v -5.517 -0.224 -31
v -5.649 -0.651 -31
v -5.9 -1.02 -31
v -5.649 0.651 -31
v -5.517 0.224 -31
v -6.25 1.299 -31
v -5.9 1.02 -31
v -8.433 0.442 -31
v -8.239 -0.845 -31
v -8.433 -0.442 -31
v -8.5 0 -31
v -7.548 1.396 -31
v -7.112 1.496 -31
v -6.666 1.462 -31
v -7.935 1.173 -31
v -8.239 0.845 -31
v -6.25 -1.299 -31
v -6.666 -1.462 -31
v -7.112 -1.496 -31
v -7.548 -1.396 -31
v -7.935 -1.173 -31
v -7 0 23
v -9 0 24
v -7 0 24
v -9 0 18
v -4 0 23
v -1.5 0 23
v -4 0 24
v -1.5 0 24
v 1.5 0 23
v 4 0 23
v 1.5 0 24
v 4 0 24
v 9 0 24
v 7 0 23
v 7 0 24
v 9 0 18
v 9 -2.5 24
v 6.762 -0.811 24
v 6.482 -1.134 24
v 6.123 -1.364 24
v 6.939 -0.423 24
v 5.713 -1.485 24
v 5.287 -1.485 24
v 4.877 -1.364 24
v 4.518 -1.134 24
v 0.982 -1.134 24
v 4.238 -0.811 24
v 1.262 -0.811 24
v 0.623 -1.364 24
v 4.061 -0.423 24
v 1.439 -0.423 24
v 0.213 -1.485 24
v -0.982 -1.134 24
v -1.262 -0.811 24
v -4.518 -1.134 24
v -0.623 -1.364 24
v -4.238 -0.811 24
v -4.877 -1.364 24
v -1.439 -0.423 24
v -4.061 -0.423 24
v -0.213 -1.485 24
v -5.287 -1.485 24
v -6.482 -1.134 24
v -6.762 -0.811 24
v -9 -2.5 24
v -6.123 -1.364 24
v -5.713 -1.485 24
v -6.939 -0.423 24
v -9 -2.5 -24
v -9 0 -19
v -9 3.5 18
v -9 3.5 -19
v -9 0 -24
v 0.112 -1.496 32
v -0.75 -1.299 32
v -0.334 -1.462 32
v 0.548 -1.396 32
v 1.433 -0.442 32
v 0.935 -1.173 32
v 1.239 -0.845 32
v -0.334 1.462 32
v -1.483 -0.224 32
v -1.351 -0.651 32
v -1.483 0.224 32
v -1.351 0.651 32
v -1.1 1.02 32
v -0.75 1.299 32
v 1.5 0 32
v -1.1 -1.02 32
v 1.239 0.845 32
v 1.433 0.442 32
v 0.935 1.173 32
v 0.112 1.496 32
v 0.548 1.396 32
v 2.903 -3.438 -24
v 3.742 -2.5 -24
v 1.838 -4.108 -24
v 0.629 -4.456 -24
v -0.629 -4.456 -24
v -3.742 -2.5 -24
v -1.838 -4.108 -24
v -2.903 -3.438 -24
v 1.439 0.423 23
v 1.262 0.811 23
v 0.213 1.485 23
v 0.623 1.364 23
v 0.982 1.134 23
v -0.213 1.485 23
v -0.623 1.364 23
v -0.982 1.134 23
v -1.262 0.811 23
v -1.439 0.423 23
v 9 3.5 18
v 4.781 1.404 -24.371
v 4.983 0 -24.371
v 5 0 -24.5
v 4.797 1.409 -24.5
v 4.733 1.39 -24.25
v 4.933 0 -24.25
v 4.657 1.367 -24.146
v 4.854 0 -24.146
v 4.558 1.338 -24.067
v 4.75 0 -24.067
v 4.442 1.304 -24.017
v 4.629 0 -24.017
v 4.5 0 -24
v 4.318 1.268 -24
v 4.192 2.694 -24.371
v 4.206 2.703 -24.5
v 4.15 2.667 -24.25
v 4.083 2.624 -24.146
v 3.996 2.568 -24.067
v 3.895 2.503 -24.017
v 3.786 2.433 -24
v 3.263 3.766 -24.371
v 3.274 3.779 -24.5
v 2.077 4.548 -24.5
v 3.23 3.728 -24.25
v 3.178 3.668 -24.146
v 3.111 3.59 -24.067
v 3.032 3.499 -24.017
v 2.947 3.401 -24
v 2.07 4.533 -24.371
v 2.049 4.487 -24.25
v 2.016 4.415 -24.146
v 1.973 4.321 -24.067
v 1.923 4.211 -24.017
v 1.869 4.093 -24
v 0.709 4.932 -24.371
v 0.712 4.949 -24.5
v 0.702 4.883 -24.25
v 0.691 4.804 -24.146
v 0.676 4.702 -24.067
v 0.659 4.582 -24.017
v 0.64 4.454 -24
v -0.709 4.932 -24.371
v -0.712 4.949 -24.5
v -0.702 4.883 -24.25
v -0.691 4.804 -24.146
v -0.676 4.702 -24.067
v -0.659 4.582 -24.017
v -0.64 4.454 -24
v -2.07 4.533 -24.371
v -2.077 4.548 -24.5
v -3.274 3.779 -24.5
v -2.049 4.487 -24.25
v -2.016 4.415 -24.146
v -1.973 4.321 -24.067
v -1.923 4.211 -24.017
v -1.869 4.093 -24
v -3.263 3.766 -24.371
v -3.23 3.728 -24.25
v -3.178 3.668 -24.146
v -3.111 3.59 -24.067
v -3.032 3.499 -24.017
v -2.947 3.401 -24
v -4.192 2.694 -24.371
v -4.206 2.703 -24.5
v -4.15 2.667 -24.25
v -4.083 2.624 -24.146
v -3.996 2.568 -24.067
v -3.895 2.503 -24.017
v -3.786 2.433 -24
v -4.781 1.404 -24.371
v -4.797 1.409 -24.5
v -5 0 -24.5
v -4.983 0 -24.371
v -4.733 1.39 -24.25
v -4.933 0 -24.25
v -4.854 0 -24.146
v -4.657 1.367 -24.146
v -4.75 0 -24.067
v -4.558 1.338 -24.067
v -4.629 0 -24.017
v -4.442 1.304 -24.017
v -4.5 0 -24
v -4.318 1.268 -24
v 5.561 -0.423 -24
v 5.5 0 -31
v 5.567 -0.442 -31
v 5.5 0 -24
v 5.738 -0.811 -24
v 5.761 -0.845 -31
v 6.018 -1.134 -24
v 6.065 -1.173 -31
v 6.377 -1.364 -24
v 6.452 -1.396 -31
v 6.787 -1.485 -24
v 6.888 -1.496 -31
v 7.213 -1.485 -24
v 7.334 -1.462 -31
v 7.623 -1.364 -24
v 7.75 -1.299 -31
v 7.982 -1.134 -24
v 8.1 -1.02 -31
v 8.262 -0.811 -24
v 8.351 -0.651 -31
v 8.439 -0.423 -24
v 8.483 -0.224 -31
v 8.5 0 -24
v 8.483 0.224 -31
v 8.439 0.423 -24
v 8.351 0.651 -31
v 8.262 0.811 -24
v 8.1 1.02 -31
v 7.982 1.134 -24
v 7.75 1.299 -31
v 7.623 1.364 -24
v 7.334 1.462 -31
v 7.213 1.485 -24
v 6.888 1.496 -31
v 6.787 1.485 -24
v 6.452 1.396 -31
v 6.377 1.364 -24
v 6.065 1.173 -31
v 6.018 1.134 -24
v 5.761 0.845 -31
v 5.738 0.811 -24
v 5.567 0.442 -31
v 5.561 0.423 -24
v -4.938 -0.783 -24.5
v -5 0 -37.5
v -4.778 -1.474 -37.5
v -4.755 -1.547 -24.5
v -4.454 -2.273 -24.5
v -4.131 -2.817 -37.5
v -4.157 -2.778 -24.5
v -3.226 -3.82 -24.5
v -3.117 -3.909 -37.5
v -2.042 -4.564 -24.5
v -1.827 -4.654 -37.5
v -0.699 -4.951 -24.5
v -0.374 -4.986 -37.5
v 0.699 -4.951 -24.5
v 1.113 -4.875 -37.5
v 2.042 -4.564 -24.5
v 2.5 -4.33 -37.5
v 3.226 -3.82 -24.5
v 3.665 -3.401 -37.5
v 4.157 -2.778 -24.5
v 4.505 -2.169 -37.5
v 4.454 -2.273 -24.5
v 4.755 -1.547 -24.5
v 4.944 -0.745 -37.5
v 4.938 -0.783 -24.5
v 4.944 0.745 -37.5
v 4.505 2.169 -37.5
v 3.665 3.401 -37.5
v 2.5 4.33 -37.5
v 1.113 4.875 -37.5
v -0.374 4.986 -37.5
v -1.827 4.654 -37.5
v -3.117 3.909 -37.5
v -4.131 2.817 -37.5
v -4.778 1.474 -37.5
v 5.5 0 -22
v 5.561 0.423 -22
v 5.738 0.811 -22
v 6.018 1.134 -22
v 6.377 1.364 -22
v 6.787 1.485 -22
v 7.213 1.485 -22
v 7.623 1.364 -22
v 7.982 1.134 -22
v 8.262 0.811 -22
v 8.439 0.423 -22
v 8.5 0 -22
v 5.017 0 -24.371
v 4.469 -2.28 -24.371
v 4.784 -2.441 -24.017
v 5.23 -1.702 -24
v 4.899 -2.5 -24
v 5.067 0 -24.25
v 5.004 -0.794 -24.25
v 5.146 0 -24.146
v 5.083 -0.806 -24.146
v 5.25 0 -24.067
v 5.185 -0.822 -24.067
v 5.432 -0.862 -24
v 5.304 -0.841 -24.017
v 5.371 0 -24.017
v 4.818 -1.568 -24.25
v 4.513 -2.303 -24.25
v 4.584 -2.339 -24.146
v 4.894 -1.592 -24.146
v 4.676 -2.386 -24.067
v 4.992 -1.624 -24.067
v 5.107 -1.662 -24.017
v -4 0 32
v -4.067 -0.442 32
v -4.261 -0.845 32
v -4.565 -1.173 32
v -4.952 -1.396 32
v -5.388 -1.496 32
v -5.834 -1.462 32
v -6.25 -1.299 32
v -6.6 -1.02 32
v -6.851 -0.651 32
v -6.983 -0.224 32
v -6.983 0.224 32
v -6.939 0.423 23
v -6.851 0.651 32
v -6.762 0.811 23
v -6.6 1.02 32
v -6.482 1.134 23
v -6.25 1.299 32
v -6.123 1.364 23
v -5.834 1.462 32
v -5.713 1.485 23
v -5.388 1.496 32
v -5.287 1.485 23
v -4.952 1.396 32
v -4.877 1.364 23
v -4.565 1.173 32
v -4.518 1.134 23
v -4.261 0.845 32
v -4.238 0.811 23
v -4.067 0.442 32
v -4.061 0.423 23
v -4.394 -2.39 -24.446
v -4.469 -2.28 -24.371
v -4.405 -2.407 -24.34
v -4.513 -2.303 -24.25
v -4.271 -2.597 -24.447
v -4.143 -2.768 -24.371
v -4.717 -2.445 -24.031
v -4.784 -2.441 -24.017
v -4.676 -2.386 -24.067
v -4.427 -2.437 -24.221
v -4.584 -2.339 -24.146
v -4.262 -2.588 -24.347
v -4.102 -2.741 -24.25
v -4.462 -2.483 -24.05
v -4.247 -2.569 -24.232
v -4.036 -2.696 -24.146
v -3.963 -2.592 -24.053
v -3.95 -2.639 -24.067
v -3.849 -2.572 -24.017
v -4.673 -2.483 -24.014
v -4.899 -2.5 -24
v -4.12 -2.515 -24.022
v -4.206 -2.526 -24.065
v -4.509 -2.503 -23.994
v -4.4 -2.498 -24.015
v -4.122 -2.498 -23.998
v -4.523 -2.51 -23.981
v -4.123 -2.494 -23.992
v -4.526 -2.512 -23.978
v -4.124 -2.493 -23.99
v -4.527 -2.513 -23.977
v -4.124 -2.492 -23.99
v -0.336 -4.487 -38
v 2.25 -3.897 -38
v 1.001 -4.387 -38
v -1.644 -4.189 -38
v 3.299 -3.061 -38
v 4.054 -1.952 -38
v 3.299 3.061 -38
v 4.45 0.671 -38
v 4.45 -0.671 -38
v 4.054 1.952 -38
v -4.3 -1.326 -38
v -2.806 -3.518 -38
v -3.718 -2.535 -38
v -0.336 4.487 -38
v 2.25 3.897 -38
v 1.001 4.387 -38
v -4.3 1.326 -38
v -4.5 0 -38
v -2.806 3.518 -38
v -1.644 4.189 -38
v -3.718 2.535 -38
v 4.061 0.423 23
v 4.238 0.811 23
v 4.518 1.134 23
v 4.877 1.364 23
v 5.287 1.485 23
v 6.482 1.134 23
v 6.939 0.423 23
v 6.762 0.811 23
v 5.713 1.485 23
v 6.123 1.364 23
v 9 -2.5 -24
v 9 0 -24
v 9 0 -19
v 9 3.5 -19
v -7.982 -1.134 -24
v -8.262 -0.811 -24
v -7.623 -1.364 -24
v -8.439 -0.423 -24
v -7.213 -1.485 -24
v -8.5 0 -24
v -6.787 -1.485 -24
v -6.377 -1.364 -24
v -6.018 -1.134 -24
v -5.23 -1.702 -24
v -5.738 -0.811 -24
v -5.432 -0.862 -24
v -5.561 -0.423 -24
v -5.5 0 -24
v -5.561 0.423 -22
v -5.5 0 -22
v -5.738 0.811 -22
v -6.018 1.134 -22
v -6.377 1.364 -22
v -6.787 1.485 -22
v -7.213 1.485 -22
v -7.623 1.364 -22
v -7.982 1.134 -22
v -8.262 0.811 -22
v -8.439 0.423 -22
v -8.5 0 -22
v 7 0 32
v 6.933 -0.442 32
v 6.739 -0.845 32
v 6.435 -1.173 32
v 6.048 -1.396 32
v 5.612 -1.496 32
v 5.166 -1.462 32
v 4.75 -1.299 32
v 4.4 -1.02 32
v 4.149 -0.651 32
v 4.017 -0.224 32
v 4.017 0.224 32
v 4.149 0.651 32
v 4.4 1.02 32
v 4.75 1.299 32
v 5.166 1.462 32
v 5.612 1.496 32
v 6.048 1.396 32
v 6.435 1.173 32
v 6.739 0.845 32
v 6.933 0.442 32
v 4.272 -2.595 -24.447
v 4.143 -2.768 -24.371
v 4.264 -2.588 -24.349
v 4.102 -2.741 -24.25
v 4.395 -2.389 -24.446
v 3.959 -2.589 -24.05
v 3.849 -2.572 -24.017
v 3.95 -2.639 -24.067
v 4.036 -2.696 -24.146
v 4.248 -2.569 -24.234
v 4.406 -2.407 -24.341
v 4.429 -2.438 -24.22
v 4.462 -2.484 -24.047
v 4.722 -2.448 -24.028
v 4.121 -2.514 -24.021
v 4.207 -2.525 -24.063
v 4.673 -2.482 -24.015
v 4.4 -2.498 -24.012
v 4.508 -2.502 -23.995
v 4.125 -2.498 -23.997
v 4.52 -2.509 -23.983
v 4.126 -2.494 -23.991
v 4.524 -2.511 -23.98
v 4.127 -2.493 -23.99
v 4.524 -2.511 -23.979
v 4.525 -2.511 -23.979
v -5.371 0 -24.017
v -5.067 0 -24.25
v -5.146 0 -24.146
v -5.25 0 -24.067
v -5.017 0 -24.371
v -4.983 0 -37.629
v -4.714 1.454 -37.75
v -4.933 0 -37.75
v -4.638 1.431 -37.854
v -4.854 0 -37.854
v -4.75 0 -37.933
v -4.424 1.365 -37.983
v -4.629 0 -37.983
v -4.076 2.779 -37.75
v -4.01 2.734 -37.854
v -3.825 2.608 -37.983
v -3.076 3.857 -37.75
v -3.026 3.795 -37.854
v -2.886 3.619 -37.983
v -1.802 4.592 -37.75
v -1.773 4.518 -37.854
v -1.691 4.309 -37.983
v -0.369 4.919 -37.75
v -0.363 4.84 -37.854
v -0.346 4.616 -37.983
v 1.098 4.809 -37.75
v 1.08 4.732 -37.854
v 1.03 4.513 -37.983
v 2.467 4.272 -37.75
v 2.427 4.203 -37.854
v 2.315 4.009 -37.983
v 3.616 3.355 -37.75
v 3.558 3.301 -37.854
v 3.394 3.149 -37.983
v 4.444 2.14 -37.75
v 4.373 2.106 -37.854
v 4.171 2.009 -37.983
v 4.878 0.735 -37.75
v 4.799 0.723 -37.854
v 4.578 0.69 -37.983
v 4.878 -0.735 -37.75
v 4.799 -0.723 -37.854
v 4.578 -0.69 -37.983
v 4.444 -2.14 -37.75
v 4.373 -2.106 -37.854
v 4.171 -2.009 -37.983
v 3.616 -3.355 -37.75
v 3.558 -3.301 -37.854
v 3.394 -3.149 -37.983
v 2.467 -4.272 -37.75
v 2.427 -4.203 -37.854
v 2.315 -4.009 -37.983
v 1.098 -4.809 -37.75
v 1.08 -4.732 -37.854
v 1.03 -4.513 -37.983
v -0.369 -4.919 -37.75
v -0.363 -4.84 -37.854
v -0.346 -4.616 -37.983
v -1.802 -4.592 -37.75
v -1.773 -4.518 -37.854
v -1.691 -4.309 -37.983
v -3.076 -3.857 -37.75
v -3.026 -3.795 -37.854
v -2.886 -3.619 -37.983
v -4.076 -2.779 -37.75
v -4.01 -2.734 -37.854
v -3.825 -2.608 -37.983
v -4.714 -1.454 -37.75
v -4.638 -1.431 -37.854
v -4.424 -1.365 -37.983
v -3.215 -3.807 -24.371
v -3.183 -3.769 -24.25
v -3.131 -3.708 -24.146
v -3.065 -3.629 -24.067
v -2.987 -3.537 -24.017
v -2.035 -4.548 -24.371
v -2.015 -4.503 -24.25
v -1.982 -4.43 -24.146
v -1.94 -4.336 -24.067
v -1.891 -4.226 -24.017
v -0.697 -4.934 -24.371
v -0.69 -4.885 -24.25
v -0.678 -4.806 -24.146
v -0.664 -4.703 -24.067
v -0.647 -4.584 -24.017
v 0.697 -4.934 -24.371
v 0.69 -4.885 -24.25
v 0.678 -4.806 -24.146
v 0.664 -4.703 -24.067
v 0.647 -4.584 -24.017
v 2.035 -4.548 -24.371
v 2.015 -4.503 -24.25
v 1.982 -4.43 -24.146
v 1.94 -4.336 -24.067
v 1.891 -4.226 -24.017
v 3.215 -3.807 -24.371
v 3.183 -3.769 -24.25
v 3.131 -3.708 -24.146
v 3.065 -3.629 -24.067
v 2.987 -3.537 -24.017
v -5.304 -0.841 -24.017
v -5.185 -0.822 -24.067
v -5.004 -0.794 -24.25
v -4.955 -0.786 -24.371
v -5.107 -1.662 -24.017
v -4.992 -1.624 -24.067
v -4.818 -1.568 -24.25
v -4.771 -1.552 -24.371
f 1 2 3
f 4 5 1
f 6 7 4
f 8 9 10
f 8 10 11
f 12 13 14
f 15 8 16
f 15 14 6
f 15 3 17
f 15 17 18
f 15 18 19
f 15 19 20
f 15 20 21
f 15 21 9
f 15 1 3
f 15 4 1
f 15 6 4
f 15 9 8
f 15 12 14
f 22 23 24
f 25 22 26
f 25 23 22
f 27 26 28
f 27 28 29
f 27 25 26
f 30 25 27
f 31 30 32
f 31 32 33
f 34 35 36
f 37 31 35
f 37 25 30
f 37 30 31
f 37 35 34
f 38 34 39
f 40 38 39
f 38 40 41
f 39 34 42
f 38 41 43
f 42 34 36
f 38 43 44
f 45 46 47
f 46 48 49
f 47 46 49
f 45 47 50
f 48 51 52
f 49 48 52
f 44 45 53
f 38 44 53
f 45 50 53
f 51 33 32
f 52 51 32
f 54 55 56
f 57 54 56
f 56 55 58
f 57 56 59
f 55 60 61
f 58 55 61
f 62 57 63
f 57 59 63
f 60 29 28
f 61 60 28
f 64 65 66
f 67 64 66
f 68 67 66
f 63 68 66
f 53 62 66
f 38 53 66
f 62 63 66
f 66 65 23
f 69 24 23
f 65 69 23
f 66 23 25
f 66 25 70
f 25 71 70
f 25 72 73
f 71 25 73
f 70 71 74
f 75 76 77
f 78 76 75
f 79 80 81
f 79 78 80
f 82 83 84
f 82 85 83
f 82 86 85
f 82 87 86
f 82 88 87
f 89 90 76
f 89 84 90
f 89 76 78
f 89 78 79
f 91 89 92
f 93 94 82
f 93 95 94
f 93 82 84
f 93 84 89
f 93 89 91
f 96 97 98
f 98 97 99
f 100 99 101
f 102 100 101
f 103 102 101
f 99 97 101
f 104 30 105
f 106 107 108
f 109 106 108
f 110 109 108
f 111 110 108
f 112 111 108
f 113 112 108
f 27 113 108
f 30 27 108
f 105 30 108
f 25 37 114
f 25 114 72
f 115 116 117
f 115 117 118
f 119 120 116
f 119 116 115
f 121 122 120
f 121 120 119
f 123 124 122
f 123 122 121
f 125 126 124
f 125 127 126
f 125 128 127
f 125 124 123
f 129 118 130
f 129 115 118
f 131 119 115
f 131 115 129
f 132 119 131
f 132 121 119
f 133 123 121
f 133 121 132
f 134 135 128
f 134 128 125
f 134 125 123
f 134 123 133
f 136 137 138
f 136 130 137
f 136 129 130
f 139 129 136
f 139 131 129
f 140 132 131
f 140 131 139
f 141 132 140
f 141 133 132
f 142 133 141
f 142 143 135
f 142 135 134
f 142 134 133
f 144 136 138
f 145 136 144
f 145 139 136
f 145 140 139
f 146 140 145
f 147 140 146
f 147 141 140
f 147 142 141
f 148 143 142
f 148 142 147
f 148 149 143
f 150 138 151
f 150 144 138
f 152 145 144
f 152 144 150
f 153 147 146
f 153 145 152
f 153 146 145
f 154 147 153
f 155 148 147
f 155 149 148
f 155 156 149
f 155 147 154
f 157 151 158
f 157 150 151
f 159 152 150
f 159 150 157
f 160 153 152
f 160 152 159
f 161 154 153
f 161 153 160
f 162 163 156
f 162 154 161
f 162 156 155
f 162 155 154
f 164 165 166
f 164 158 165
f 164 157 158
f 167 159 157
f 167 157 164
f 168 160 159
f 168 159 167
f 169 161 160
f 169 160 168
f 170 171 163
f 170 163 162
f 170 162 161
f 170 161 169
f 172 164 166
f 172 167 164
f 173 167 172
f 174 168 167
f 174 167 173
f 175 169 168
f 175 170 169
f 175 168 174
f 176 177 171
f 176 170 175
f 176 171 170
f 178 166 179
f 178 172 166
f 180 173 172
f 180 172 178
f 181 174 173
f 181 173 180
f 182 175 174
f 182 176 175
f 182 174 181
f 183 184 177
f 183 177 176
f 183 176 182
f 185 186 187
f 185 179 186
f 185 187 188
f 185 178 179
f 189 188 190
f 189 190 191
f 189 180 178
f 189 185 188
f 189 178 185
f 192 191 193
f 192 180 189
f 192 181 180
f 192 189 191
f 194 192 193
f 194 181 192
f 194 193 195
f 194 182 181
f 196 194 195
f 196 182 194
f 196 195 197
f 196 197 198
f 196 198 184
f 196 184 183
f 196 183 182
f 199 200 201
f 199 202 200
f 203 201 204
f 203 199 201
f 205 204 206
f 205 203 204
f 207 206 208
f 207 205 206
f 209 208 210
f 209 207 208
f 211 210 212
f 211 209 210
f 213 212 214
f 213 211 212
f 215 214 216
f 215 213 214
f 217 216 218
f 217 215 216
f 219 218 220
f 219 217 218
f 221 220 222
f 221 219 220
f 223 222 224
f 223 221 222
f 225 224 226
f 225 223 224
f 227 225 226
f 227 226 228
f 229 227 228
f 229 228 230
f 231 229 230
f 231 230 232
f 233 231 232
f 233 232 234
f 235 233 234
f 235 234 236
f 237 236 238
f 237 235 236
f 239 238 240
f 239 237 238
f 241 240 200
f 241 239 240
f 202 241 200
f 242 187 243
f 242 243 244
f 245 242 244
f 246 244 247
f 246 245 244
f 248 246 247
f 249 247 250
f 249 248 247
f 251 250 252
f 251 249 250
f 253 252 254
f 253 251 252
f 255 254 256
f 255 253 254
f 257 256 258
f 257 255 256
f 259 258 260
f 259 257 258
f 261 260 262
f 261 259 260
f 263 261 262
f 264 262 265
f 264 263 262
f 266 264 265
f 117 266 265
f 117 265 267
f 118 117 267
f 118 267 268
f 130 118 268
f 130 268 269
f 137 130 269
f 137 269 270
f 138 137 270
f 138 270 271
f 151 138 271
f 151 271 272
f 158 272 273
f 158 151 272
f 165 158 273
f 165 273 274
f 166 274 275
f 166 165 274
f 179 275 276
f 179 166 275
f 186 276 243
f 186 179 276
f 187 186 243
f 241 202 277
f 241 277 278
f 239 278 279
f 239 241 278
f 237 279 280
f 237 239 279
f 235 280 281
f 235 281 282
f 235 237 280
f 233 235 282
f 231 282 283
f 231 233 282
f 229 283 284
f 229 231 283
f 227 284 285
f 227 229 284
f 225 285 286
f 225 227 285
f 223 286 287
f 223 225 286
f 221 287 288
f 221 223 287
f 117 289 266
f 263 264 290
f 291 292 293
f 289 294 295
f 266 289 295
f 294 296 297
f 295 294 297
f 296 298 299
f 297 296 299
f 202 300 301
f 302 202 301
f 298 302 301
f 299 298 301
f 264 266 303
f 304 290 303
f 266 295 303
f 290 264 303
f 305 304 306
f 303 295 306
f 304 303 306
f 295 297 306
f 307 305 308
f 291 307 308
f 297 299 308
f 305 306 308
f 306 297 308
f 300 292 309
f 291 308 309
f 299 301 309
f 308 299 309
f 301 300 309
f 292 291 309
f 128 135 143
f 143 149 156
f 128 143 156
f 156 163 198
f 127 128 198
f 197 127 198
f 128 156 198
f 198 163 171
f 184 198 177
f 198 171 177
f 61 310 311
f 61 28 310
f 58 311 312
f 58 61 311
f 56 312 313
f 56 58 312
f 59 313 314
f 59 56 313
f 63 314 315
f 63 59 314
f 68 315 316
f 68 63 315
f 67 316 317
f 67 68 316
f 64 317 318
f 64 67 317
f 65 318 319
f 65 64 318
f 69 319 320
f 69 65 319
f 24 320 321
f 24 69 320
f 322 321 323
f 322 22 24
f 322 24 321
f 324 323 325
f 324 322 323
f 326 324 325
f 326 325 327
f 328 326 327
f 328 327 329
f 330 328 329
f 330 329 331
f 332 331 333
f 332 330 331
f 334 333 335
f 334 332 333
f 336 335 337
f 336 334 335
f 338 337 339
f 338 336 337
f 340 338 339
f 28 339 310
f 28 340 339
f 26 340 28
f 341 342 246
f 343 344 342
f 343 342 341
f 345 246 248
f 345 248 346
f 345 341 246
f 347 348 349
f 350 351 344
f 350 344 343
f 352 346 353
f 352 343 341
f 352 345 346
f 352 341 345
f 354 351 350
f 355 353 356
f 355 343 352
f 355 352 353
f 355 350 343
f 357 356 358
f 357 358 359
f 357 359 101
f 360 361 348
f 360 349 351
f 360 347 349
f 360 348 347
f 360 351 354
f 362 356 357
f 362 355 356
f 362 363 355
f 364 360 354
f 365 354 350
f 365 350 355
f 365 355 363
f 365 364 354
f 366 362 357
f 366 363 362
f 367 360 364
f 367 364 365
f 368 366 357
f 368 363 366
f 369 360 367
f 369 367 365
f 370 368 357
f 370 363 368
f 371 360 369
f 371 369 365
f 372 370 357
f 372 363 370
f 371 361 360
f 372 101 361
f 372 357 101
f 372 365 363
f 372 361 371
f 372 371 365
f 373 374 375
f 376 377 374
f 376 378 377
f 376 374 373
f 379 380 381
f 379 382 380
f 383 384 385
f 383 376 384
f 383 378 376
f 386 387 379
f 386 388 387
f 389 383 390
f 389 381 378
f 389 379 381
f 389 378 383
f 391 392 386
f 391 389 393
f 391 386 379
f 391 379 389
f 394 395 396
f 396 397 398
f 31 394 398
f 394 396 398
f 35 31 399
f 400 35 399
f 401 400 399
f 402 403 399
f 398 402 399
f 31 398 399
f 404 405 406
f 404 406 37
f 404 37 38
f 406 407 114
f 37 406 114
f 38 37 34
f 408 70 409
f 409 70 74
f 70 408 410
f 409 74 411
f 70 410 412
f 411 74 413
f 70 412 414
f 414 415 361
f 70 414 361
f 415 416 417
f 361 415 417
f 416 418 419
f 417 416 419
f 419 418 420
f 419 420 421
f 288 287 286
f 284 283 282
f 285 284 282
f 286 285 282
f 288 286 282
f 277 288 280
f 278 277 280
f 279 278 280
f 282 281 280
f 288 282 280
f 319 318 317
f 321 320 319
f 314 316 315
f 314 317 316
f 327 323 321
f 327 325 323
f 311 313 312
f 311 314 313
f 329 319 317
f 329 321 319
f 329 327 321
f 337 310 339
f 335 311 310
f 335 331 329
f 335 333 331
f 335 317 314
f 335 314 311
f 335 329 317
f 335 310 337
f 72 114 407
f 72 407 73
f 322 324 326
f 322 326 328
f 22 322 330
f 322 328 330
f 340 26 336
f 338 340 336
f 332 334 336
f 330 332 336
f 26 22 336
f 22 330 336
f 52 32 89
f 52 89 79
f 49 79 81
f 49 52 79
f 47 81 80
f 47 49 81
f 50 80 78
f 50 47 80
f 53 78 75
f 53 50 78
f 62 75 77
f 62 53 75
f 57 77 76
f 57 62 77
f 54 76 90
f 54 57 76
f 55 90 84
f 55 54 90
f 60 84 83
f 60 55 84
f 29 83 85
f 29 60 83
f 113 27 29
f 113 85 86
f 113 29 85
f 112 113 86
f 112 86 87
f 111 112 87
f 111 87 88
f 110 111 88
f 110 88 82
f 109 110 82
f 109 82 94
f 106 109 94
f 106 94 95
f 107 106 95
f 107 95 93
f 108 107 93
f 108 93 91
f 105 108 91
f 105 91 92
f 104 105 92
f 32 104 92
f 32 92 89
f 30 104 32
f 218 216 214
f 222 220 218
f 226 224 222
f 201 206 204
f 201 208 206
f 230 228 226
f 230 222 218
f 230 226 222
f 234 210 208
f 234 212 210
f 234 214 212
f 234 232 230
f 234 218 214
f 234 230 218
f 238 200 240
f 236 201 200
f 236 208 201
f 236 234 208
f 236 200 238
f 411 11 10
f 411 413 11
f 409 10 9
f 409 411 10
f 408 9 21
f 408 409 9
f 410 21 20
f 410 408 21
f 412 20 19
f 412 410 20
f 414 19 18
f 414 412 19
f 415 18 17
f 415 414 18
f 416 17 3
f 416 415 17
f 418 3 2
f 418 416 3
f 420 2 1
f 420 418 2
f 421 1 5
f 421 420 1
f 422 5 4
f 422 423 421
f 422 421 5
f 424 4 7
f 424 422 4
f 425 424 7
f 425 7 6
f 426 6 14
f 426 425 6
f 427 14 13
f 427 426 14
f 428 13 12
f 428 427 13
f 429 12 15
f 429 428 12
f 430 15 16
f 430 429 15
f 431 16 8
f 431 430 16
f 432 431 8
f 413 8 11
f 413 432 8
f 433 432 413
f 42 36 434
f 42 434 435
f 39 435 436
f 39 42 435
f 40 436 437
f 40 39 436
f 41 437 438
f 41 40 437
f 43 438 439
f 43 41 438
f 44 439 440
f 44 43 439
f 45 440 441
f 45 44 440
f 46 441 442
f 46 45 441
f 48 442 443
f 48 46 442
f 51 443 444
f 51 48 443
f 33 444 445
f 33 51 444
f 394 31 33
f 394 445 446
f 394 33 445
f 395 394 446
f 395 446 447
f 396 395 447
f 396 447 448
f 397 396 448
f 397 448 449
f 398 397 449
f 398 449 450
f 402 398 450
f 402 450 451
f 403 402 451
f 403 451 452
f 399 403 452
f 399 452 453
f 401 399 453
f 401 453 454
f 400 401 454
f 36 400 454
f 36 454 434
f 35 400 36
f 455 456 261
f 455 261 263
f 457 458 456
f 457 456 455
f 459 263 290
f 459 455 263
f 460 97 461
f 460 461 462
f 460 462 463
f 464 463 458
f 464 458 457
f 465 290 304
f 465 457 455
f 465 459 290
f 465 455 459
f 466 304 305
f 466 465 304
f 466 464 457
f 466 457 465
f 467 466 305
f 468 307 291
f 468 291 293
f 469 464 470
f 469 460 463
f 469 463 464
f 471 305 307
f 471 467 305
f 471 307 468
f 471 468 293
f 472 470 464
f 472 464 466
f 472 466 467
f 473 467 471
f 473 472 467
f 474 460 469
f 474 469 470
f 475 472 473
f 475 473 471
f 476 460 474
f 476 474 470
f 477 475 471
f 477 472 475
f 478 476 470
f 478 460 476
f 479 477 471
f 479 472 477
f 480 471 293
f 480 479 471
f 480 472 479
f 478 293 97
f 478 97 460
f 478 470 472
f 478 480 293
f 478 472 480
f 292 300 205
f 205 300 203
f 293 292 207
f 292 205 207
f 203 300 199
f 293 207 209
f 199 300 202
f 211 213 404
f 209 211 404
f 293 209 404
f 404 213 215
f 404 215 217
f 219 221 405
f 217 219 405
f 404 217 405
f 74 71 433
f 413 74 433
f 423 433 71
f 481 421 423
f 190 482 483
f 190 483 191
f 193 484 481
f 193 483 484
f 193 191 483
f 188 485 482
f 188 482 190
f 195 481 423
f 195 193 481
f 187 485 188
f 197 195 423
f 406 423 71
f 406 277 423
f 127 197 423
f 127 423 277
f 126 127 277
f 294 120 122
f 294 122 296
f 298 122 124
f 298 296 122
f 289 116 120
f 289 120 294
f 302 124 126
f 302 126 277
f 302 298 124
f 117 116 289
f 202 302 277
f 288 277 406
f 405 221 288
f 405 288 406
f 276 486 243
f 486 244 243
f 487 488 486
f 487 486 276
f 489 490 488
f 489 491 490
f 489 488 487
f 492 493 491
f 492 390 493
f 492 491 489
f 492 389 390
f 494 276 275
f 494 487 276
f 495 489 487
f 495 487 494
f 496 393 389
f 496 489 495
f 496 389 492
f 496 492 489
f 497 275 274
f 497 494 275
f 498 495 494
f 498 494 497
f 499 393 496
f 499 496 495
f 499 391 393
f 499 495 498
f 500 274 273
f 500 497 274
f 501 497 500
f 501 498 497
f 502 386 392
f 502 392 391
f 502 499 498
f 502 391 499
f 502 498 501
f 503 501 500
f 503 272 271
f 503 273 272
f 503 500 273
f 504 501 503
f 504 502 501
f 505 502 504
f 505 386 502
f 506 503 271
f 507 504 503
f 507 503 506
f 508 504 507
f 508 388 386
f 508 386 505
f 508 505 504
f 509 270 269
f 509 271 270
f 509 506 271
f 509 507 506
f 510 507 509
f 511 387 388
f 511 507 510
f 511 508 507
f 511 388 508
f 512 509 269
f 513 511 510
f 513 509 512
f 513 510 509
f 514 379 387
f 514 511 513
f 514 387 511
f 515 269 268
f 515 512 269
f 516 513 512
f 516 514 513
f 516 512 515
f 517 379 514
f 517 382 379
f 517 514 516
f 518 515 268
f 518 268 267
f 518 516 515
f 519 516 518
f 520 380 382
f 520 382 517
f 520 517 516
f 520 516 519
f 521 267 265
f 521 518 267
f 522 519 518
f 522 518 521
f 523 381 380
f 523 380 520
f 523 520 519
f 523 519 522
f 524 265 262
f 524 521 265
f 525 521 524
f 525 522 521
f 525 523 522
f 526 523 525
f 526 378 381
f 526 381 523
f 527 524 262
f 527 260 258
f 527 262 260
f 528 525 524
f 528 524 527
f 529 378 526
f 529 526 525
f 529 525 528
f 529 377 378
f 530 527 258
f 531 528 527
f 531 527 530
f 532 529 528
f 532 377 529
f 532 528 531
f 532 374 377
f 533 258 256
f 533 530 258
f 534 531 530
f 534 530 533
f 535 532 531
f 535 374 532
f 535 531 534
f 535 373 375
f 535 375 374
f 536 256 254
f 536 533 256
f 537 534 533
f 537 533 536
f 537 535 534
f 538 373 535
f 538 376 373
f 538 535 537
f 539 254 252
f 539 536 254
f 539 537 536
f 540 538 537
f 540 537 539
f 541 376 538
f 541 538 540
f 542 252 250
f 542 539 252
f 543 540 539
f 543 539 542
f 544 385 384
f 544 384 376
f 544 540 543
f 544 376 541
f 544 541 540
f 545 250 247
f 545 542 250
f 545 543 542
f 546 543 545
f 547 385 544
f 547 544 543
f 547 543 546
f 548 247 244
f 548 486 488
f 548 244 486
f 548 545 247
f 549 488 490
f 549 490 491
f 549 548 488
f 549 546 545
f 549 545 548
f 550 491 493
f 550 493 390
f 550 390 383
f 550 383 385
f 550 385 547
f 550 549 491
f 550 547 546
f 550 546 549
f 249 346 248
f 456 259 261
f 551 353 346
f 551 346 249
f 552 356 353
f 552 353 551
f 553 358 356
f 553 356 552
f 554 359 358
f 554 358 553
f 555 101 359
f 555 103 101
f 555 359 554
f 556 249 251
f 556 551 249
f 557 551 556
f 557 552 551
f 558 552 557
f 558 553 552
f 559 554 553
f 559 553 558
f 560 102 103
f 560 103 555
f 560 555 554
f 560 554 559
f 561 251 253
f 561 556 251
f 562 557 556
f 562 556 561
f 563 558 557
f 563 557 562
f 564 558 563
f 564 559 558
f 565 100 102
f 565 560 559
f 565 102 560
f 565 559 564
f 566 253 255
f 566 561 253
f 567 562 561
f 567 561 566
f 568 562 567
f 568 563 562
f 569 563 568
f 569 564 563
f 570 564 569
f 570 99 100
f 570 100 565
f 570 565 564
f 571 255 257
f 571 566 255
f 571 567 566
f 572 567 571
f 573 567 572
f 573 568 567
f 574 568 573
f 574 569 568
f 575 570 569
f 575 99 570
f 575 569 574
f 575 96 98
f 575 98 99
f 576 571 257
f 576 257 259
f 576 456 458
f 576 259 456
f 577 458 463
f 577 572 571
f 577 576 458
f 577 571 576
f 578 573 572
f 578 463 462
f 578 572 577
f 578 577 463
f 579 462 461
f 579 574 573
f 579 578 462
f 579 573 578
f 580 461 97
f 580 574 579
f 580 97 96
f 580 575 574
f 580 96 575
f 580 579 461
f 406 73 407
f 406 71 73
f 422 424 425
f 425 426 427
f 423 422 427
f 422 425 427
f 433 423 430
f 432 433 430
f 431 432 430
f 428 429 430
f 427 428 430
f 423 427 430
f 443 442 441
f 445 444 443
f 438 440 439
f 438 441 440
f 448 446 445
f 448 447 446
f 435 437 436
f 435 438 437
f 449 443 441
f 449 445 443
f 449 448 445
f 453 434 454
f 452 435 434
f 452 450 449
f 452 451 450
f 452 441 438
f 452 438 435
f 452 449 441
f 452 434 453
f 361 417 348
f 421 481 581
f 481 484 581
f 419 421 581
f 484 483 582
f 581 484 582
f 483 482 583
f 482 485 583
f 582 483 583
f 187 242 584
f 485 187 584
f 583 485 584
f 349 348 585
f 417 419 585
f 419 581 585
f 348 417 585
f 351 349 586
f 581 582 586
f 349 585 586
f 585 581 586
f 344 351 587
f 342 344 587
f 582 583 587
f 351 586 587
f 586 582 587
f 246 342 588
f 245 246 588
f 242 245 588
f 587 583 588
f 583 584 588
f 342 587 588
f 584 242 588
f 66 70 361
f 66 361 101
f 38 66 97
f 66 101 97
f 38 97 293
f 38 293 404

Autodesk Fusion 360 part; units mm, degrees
sketch "Sketch1" plane through (0, 0, 0) normal (0, 1, 0) x (1, 0, 0)
  line L0 (-9, 24) -> (9, 24)
  line L1 (9, 24) -> (9, -24)
  line L2 (9, -24) -> (-9, -24)
  line L3 (-9, -24) -> (-9, 24)
  line L4 (-9, 24) -> (9, -24) construction
  line L5 (9, 24) -> (-9, -24) construction
  dimension "d1" = 18
  dimension "d2" = 48
extrude "Extrude1" add sketch "Sketch1" against normal blind 2.5
sketch "Sketch2" plane through (0, 0, 0) normal (0, 1, 0) x (-1, 0, 0)
  line L0 (9, 24) -> (-9, 24)
  line L1 (-9, 24) -> (-9, -24)
  line L2 (-9, -24) -> (9, -24)
  line L3 (9, -24) -> (9, 24)
  line L4 (9, -19) -> (-9, -19)
  line L5 (-9, -19) -> (-9, 18)
  line L6 (-9, 18) -> (9, 18)
  line L7 (9, 18) -> (9, -19)
  dimension "d5" = 37
  dimension "d6" = 5
extrude "Extrude2" add sketch "Sketch2" along normal blind 3.5 contours L1 L3 L4 L5 L6 L7
sketch "Sketch3" plane through (0, 0, -24) normal (0, 0, -1) x (-1, 0, 0)
  line L0 (9, 0) -> (-9, 0)
  line L1 (-9, 0) -> (-9, -2.5)
  line L2 (-9, -2.5) -> (9, -2.5)
  line L3 (9, -2.5) -> (9, 0)
  circle A0 centre (0, 0) radius 5
  dimension "d9" = 10
extrude "Extrude3" add sketch "Sketch3" along normal blind 14 contours L0 L2 A0 | L0 A0 | L2 A0
fillet "Fillet1" radius 0.5 5 edges at (4.6616, -1.8081, -38) (0, 5, -24) (4.8296, -1.2941, -24) (0, -5, -24) (-4.8296, -1.2941, -24)
sketch "Sketch4" plane through (0, 0, 24) normal (0, 0, 1) x (1, 0, 0)
  line L0 (9, 0) -> (-9, 0)
  line L1 (-9, 0) -> (-9, -2.5)
  line L2 (-9, -2.5) -> (9, -2.5)
  line L3 (9, -2.5) -> (9, 0)
  circle A0 centre (0, 0) radius 1.5
  circle A1 centre (5.5, 0) radius 1.5
  circle A2 centre (-5.5, 0) radius 1.5
  point P0 (5.5, 0)
  point P1 (-5.5, 0)
  dimension "d13" = 3
extrude "Extrude4" add sketch "Sketch4" along normal blind 8 contours L0 A1 | L0 A1 | L0 A0 | L0 A0 | L0 A2 | L0 A2
extrude "Extrude5" add 3 faces at (5.8665, 0.3401, 24) (0.3665, 0.3401, 24) (-5.1335, 0.3401, 24) along direction (0, 0, -1) blind 1
sketch "Sketch5" plane through (0, 0, -24) normal (0, 0, -1) x (-1, 0, 0)
  arc A0 (-5.5, 0) -> (-4.899, -2.5) centre (0, 0) ccw
  line L0 (-5.5, 0) -> (-9, 0)
  line L1 (-9, 0) -> (-9, -2.5)
  line L2 (-9, -2.5) -> (-4.899, -2.5)
  circle A1 centre (-7, 0) radius 1.5
  circle A2 centre (7, 0) radius 1.5
  point P0 (-7, 0)
  point P1 (7, 0)
  dimension "d18" = 3
  dimension "d19" = 3
extrude "Extrude6" add sketch "Sketch5" along normal blind 7 contours L0 A1 | L0 A1 | A2
extrude "Extrude7" add 2 faces at (-7.3665, 0.4891, -24) (6.6335, 0.3401, -24) along direction (0, 0, 1) blind 2
